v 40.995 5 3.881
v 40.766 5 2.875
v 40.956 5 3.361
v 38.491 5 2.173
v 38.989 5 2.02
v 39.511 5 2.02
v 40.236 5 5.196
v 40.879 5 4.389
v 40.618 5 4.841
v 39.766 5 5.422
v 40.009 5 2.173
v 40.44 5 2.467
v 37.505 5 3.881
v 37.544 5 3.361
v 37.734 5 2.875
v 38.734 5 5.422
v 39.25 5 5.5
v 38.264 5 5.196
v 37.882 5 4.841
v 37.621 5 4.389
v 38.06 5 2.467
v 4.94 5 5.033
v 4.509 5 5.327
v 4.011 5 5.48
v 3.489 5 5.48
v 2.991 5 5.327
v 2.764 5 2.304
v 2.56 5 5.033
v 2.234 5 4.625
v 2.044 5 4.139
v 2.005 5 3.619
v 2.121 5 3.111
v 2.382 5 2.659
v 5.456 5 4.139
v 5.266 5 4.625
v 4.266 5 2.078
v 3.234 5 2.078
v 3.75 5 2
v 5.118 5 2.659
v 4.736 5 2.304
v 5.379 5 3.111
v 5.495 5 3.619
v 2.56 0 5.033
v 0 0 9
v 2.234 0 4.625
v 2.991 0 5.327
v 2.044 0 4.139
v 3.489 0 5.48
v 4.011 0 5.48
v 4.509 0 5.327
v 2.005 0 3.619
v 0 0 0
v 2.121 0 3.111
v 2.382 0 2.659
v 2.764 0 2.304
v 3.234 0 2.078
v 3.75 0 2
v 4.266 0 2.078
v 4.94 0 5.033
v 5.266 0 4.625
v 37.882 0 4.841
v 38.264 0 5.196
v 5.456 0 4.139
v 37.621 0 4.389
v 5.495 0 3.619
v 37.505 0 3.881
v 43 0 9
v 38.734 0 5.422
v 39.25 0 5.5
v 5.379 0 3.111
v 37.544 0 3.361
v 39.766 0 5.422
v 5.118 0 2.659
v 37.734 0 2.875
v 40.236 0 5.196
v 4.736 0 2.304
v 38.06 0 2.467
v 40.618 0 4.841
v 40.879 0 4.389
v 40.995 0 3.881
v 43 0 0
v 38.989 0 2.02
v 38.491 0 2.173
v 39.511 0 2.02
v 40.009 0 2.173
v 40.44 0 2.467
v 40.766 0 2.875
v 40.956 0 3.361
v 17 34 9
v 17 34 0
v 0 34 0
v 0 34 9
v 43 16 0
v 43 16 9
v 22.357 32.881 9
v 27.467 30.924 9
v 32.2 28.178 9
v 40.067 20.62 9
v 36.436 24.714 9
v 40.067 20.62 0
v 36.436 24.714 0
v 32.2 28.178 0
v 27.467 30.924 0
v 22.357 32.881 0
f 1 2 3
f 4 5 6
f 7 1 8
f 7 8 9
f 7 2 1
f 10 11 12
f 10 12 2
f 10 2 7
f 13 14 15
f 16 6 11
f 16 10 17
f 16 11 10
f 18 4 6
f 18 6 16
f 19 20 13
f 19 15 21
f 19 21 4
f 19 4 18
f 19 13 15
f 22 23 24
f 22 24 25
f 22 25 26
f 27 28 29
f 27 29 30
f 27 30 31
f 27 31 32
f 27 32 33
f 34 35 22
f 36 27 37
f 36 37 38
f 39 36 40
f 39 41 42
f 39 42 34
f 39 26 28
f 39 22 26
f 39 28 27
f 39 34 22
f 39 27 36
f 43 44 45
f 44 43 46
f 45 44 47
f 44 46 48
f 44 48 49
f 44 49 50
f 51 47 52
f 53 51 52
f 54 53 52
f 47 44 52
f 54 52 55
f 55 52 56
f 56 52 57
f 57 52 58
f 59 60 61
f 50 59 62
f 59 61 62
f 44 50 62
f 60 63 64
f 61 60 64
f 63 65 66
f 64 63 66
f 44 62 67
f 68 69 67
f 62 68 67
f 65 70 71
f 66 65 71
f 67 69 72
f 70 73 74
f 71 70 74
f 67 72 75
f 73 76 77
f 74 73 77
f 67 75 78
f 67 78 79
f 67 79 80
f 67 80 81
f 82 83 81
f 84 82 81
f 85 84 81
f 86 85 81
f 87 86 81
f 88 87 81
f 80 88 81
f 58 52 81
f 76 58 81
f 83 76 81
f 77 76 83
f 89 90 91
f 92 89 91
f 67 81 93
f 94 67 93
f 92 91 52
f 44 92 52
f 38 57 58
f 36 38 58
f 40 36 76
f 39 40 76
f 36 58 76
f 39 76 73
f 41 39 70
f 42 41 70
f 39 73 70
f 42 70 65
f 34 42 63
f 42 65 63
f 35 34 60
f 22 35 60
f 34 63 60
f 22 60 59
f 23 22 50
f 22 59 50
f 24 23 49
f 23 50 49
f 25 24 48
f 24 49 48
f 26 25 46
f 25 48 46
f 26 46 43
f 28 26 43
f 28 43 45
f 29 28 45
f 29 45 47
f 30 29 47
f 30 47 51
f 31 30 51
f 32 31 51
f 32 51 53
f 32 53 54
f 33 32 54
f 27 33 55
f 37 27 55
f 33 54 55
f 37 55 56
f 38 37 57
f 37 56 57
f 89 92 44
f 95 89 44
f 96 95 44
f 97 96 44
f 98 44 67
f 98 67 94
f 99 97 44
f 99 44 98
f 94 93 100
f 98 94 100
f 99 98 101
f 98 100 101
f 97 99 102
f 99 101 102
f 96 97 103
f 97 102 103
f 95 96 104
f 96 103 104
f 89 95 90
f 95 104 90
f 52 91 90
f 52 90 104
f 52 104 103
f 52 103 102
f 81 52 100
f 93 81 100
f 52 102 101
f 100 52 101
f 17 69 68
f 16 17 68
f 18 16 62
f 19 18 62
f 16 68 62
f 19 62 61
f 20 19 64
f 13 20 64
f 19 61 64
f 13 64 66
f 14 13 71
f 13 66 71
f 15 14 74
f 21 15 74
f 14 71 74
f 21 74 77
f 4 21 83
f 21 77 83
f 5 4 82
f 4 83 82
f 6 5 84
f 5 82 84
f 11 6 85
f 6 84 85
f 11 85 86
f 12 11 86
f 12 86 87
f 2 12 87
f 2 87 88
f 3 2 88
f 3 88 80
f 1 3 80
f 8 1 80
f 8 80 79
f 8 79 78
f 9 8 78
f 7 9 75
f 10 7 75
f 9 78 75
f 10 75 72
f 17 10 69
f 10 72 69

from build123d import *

# Parameters (mm, degrees)
EXTRUDE_1_DEPTH     = 9
SKETCH_2_R          = 1.75
CUT_EXTRUDE_1_DEPTH = 5


with BuildPart() as part:
    # 草图1 → 凸台-拉伸1 (new body)
    with BuildSketch(Plane.XY):
        with BuildLine():
            Line((0, 0), (43, 0))
            Line((43, 0), (43, 16))
            ThreePointArc((43, 16), (32.200157728, 28.178005607), (17, 34))
            Line((17, 34), (0, 34))
            Line((0, 34), (0, 0))
        make_face()
    extrude(amount=EXTRUDE_1_DEPTH)

    # 草图2 → 切除-拉伸1 (cut)
    with BuildSketch(Plane.XZ):
        with Locations(Location((3.75, 3.75, 0), (0, 0, 270))):
            Circle(SKETCH_2_R)
        with Locations(Location((39.25, 3.75, 0), (0, 0, 90))):
            Circle(SKETCH_2_R)
    extrude(amount=-CUT_EXTRUDE_1_DEPTH, mode=Mode.SUBTRACT)


solid = part.part
